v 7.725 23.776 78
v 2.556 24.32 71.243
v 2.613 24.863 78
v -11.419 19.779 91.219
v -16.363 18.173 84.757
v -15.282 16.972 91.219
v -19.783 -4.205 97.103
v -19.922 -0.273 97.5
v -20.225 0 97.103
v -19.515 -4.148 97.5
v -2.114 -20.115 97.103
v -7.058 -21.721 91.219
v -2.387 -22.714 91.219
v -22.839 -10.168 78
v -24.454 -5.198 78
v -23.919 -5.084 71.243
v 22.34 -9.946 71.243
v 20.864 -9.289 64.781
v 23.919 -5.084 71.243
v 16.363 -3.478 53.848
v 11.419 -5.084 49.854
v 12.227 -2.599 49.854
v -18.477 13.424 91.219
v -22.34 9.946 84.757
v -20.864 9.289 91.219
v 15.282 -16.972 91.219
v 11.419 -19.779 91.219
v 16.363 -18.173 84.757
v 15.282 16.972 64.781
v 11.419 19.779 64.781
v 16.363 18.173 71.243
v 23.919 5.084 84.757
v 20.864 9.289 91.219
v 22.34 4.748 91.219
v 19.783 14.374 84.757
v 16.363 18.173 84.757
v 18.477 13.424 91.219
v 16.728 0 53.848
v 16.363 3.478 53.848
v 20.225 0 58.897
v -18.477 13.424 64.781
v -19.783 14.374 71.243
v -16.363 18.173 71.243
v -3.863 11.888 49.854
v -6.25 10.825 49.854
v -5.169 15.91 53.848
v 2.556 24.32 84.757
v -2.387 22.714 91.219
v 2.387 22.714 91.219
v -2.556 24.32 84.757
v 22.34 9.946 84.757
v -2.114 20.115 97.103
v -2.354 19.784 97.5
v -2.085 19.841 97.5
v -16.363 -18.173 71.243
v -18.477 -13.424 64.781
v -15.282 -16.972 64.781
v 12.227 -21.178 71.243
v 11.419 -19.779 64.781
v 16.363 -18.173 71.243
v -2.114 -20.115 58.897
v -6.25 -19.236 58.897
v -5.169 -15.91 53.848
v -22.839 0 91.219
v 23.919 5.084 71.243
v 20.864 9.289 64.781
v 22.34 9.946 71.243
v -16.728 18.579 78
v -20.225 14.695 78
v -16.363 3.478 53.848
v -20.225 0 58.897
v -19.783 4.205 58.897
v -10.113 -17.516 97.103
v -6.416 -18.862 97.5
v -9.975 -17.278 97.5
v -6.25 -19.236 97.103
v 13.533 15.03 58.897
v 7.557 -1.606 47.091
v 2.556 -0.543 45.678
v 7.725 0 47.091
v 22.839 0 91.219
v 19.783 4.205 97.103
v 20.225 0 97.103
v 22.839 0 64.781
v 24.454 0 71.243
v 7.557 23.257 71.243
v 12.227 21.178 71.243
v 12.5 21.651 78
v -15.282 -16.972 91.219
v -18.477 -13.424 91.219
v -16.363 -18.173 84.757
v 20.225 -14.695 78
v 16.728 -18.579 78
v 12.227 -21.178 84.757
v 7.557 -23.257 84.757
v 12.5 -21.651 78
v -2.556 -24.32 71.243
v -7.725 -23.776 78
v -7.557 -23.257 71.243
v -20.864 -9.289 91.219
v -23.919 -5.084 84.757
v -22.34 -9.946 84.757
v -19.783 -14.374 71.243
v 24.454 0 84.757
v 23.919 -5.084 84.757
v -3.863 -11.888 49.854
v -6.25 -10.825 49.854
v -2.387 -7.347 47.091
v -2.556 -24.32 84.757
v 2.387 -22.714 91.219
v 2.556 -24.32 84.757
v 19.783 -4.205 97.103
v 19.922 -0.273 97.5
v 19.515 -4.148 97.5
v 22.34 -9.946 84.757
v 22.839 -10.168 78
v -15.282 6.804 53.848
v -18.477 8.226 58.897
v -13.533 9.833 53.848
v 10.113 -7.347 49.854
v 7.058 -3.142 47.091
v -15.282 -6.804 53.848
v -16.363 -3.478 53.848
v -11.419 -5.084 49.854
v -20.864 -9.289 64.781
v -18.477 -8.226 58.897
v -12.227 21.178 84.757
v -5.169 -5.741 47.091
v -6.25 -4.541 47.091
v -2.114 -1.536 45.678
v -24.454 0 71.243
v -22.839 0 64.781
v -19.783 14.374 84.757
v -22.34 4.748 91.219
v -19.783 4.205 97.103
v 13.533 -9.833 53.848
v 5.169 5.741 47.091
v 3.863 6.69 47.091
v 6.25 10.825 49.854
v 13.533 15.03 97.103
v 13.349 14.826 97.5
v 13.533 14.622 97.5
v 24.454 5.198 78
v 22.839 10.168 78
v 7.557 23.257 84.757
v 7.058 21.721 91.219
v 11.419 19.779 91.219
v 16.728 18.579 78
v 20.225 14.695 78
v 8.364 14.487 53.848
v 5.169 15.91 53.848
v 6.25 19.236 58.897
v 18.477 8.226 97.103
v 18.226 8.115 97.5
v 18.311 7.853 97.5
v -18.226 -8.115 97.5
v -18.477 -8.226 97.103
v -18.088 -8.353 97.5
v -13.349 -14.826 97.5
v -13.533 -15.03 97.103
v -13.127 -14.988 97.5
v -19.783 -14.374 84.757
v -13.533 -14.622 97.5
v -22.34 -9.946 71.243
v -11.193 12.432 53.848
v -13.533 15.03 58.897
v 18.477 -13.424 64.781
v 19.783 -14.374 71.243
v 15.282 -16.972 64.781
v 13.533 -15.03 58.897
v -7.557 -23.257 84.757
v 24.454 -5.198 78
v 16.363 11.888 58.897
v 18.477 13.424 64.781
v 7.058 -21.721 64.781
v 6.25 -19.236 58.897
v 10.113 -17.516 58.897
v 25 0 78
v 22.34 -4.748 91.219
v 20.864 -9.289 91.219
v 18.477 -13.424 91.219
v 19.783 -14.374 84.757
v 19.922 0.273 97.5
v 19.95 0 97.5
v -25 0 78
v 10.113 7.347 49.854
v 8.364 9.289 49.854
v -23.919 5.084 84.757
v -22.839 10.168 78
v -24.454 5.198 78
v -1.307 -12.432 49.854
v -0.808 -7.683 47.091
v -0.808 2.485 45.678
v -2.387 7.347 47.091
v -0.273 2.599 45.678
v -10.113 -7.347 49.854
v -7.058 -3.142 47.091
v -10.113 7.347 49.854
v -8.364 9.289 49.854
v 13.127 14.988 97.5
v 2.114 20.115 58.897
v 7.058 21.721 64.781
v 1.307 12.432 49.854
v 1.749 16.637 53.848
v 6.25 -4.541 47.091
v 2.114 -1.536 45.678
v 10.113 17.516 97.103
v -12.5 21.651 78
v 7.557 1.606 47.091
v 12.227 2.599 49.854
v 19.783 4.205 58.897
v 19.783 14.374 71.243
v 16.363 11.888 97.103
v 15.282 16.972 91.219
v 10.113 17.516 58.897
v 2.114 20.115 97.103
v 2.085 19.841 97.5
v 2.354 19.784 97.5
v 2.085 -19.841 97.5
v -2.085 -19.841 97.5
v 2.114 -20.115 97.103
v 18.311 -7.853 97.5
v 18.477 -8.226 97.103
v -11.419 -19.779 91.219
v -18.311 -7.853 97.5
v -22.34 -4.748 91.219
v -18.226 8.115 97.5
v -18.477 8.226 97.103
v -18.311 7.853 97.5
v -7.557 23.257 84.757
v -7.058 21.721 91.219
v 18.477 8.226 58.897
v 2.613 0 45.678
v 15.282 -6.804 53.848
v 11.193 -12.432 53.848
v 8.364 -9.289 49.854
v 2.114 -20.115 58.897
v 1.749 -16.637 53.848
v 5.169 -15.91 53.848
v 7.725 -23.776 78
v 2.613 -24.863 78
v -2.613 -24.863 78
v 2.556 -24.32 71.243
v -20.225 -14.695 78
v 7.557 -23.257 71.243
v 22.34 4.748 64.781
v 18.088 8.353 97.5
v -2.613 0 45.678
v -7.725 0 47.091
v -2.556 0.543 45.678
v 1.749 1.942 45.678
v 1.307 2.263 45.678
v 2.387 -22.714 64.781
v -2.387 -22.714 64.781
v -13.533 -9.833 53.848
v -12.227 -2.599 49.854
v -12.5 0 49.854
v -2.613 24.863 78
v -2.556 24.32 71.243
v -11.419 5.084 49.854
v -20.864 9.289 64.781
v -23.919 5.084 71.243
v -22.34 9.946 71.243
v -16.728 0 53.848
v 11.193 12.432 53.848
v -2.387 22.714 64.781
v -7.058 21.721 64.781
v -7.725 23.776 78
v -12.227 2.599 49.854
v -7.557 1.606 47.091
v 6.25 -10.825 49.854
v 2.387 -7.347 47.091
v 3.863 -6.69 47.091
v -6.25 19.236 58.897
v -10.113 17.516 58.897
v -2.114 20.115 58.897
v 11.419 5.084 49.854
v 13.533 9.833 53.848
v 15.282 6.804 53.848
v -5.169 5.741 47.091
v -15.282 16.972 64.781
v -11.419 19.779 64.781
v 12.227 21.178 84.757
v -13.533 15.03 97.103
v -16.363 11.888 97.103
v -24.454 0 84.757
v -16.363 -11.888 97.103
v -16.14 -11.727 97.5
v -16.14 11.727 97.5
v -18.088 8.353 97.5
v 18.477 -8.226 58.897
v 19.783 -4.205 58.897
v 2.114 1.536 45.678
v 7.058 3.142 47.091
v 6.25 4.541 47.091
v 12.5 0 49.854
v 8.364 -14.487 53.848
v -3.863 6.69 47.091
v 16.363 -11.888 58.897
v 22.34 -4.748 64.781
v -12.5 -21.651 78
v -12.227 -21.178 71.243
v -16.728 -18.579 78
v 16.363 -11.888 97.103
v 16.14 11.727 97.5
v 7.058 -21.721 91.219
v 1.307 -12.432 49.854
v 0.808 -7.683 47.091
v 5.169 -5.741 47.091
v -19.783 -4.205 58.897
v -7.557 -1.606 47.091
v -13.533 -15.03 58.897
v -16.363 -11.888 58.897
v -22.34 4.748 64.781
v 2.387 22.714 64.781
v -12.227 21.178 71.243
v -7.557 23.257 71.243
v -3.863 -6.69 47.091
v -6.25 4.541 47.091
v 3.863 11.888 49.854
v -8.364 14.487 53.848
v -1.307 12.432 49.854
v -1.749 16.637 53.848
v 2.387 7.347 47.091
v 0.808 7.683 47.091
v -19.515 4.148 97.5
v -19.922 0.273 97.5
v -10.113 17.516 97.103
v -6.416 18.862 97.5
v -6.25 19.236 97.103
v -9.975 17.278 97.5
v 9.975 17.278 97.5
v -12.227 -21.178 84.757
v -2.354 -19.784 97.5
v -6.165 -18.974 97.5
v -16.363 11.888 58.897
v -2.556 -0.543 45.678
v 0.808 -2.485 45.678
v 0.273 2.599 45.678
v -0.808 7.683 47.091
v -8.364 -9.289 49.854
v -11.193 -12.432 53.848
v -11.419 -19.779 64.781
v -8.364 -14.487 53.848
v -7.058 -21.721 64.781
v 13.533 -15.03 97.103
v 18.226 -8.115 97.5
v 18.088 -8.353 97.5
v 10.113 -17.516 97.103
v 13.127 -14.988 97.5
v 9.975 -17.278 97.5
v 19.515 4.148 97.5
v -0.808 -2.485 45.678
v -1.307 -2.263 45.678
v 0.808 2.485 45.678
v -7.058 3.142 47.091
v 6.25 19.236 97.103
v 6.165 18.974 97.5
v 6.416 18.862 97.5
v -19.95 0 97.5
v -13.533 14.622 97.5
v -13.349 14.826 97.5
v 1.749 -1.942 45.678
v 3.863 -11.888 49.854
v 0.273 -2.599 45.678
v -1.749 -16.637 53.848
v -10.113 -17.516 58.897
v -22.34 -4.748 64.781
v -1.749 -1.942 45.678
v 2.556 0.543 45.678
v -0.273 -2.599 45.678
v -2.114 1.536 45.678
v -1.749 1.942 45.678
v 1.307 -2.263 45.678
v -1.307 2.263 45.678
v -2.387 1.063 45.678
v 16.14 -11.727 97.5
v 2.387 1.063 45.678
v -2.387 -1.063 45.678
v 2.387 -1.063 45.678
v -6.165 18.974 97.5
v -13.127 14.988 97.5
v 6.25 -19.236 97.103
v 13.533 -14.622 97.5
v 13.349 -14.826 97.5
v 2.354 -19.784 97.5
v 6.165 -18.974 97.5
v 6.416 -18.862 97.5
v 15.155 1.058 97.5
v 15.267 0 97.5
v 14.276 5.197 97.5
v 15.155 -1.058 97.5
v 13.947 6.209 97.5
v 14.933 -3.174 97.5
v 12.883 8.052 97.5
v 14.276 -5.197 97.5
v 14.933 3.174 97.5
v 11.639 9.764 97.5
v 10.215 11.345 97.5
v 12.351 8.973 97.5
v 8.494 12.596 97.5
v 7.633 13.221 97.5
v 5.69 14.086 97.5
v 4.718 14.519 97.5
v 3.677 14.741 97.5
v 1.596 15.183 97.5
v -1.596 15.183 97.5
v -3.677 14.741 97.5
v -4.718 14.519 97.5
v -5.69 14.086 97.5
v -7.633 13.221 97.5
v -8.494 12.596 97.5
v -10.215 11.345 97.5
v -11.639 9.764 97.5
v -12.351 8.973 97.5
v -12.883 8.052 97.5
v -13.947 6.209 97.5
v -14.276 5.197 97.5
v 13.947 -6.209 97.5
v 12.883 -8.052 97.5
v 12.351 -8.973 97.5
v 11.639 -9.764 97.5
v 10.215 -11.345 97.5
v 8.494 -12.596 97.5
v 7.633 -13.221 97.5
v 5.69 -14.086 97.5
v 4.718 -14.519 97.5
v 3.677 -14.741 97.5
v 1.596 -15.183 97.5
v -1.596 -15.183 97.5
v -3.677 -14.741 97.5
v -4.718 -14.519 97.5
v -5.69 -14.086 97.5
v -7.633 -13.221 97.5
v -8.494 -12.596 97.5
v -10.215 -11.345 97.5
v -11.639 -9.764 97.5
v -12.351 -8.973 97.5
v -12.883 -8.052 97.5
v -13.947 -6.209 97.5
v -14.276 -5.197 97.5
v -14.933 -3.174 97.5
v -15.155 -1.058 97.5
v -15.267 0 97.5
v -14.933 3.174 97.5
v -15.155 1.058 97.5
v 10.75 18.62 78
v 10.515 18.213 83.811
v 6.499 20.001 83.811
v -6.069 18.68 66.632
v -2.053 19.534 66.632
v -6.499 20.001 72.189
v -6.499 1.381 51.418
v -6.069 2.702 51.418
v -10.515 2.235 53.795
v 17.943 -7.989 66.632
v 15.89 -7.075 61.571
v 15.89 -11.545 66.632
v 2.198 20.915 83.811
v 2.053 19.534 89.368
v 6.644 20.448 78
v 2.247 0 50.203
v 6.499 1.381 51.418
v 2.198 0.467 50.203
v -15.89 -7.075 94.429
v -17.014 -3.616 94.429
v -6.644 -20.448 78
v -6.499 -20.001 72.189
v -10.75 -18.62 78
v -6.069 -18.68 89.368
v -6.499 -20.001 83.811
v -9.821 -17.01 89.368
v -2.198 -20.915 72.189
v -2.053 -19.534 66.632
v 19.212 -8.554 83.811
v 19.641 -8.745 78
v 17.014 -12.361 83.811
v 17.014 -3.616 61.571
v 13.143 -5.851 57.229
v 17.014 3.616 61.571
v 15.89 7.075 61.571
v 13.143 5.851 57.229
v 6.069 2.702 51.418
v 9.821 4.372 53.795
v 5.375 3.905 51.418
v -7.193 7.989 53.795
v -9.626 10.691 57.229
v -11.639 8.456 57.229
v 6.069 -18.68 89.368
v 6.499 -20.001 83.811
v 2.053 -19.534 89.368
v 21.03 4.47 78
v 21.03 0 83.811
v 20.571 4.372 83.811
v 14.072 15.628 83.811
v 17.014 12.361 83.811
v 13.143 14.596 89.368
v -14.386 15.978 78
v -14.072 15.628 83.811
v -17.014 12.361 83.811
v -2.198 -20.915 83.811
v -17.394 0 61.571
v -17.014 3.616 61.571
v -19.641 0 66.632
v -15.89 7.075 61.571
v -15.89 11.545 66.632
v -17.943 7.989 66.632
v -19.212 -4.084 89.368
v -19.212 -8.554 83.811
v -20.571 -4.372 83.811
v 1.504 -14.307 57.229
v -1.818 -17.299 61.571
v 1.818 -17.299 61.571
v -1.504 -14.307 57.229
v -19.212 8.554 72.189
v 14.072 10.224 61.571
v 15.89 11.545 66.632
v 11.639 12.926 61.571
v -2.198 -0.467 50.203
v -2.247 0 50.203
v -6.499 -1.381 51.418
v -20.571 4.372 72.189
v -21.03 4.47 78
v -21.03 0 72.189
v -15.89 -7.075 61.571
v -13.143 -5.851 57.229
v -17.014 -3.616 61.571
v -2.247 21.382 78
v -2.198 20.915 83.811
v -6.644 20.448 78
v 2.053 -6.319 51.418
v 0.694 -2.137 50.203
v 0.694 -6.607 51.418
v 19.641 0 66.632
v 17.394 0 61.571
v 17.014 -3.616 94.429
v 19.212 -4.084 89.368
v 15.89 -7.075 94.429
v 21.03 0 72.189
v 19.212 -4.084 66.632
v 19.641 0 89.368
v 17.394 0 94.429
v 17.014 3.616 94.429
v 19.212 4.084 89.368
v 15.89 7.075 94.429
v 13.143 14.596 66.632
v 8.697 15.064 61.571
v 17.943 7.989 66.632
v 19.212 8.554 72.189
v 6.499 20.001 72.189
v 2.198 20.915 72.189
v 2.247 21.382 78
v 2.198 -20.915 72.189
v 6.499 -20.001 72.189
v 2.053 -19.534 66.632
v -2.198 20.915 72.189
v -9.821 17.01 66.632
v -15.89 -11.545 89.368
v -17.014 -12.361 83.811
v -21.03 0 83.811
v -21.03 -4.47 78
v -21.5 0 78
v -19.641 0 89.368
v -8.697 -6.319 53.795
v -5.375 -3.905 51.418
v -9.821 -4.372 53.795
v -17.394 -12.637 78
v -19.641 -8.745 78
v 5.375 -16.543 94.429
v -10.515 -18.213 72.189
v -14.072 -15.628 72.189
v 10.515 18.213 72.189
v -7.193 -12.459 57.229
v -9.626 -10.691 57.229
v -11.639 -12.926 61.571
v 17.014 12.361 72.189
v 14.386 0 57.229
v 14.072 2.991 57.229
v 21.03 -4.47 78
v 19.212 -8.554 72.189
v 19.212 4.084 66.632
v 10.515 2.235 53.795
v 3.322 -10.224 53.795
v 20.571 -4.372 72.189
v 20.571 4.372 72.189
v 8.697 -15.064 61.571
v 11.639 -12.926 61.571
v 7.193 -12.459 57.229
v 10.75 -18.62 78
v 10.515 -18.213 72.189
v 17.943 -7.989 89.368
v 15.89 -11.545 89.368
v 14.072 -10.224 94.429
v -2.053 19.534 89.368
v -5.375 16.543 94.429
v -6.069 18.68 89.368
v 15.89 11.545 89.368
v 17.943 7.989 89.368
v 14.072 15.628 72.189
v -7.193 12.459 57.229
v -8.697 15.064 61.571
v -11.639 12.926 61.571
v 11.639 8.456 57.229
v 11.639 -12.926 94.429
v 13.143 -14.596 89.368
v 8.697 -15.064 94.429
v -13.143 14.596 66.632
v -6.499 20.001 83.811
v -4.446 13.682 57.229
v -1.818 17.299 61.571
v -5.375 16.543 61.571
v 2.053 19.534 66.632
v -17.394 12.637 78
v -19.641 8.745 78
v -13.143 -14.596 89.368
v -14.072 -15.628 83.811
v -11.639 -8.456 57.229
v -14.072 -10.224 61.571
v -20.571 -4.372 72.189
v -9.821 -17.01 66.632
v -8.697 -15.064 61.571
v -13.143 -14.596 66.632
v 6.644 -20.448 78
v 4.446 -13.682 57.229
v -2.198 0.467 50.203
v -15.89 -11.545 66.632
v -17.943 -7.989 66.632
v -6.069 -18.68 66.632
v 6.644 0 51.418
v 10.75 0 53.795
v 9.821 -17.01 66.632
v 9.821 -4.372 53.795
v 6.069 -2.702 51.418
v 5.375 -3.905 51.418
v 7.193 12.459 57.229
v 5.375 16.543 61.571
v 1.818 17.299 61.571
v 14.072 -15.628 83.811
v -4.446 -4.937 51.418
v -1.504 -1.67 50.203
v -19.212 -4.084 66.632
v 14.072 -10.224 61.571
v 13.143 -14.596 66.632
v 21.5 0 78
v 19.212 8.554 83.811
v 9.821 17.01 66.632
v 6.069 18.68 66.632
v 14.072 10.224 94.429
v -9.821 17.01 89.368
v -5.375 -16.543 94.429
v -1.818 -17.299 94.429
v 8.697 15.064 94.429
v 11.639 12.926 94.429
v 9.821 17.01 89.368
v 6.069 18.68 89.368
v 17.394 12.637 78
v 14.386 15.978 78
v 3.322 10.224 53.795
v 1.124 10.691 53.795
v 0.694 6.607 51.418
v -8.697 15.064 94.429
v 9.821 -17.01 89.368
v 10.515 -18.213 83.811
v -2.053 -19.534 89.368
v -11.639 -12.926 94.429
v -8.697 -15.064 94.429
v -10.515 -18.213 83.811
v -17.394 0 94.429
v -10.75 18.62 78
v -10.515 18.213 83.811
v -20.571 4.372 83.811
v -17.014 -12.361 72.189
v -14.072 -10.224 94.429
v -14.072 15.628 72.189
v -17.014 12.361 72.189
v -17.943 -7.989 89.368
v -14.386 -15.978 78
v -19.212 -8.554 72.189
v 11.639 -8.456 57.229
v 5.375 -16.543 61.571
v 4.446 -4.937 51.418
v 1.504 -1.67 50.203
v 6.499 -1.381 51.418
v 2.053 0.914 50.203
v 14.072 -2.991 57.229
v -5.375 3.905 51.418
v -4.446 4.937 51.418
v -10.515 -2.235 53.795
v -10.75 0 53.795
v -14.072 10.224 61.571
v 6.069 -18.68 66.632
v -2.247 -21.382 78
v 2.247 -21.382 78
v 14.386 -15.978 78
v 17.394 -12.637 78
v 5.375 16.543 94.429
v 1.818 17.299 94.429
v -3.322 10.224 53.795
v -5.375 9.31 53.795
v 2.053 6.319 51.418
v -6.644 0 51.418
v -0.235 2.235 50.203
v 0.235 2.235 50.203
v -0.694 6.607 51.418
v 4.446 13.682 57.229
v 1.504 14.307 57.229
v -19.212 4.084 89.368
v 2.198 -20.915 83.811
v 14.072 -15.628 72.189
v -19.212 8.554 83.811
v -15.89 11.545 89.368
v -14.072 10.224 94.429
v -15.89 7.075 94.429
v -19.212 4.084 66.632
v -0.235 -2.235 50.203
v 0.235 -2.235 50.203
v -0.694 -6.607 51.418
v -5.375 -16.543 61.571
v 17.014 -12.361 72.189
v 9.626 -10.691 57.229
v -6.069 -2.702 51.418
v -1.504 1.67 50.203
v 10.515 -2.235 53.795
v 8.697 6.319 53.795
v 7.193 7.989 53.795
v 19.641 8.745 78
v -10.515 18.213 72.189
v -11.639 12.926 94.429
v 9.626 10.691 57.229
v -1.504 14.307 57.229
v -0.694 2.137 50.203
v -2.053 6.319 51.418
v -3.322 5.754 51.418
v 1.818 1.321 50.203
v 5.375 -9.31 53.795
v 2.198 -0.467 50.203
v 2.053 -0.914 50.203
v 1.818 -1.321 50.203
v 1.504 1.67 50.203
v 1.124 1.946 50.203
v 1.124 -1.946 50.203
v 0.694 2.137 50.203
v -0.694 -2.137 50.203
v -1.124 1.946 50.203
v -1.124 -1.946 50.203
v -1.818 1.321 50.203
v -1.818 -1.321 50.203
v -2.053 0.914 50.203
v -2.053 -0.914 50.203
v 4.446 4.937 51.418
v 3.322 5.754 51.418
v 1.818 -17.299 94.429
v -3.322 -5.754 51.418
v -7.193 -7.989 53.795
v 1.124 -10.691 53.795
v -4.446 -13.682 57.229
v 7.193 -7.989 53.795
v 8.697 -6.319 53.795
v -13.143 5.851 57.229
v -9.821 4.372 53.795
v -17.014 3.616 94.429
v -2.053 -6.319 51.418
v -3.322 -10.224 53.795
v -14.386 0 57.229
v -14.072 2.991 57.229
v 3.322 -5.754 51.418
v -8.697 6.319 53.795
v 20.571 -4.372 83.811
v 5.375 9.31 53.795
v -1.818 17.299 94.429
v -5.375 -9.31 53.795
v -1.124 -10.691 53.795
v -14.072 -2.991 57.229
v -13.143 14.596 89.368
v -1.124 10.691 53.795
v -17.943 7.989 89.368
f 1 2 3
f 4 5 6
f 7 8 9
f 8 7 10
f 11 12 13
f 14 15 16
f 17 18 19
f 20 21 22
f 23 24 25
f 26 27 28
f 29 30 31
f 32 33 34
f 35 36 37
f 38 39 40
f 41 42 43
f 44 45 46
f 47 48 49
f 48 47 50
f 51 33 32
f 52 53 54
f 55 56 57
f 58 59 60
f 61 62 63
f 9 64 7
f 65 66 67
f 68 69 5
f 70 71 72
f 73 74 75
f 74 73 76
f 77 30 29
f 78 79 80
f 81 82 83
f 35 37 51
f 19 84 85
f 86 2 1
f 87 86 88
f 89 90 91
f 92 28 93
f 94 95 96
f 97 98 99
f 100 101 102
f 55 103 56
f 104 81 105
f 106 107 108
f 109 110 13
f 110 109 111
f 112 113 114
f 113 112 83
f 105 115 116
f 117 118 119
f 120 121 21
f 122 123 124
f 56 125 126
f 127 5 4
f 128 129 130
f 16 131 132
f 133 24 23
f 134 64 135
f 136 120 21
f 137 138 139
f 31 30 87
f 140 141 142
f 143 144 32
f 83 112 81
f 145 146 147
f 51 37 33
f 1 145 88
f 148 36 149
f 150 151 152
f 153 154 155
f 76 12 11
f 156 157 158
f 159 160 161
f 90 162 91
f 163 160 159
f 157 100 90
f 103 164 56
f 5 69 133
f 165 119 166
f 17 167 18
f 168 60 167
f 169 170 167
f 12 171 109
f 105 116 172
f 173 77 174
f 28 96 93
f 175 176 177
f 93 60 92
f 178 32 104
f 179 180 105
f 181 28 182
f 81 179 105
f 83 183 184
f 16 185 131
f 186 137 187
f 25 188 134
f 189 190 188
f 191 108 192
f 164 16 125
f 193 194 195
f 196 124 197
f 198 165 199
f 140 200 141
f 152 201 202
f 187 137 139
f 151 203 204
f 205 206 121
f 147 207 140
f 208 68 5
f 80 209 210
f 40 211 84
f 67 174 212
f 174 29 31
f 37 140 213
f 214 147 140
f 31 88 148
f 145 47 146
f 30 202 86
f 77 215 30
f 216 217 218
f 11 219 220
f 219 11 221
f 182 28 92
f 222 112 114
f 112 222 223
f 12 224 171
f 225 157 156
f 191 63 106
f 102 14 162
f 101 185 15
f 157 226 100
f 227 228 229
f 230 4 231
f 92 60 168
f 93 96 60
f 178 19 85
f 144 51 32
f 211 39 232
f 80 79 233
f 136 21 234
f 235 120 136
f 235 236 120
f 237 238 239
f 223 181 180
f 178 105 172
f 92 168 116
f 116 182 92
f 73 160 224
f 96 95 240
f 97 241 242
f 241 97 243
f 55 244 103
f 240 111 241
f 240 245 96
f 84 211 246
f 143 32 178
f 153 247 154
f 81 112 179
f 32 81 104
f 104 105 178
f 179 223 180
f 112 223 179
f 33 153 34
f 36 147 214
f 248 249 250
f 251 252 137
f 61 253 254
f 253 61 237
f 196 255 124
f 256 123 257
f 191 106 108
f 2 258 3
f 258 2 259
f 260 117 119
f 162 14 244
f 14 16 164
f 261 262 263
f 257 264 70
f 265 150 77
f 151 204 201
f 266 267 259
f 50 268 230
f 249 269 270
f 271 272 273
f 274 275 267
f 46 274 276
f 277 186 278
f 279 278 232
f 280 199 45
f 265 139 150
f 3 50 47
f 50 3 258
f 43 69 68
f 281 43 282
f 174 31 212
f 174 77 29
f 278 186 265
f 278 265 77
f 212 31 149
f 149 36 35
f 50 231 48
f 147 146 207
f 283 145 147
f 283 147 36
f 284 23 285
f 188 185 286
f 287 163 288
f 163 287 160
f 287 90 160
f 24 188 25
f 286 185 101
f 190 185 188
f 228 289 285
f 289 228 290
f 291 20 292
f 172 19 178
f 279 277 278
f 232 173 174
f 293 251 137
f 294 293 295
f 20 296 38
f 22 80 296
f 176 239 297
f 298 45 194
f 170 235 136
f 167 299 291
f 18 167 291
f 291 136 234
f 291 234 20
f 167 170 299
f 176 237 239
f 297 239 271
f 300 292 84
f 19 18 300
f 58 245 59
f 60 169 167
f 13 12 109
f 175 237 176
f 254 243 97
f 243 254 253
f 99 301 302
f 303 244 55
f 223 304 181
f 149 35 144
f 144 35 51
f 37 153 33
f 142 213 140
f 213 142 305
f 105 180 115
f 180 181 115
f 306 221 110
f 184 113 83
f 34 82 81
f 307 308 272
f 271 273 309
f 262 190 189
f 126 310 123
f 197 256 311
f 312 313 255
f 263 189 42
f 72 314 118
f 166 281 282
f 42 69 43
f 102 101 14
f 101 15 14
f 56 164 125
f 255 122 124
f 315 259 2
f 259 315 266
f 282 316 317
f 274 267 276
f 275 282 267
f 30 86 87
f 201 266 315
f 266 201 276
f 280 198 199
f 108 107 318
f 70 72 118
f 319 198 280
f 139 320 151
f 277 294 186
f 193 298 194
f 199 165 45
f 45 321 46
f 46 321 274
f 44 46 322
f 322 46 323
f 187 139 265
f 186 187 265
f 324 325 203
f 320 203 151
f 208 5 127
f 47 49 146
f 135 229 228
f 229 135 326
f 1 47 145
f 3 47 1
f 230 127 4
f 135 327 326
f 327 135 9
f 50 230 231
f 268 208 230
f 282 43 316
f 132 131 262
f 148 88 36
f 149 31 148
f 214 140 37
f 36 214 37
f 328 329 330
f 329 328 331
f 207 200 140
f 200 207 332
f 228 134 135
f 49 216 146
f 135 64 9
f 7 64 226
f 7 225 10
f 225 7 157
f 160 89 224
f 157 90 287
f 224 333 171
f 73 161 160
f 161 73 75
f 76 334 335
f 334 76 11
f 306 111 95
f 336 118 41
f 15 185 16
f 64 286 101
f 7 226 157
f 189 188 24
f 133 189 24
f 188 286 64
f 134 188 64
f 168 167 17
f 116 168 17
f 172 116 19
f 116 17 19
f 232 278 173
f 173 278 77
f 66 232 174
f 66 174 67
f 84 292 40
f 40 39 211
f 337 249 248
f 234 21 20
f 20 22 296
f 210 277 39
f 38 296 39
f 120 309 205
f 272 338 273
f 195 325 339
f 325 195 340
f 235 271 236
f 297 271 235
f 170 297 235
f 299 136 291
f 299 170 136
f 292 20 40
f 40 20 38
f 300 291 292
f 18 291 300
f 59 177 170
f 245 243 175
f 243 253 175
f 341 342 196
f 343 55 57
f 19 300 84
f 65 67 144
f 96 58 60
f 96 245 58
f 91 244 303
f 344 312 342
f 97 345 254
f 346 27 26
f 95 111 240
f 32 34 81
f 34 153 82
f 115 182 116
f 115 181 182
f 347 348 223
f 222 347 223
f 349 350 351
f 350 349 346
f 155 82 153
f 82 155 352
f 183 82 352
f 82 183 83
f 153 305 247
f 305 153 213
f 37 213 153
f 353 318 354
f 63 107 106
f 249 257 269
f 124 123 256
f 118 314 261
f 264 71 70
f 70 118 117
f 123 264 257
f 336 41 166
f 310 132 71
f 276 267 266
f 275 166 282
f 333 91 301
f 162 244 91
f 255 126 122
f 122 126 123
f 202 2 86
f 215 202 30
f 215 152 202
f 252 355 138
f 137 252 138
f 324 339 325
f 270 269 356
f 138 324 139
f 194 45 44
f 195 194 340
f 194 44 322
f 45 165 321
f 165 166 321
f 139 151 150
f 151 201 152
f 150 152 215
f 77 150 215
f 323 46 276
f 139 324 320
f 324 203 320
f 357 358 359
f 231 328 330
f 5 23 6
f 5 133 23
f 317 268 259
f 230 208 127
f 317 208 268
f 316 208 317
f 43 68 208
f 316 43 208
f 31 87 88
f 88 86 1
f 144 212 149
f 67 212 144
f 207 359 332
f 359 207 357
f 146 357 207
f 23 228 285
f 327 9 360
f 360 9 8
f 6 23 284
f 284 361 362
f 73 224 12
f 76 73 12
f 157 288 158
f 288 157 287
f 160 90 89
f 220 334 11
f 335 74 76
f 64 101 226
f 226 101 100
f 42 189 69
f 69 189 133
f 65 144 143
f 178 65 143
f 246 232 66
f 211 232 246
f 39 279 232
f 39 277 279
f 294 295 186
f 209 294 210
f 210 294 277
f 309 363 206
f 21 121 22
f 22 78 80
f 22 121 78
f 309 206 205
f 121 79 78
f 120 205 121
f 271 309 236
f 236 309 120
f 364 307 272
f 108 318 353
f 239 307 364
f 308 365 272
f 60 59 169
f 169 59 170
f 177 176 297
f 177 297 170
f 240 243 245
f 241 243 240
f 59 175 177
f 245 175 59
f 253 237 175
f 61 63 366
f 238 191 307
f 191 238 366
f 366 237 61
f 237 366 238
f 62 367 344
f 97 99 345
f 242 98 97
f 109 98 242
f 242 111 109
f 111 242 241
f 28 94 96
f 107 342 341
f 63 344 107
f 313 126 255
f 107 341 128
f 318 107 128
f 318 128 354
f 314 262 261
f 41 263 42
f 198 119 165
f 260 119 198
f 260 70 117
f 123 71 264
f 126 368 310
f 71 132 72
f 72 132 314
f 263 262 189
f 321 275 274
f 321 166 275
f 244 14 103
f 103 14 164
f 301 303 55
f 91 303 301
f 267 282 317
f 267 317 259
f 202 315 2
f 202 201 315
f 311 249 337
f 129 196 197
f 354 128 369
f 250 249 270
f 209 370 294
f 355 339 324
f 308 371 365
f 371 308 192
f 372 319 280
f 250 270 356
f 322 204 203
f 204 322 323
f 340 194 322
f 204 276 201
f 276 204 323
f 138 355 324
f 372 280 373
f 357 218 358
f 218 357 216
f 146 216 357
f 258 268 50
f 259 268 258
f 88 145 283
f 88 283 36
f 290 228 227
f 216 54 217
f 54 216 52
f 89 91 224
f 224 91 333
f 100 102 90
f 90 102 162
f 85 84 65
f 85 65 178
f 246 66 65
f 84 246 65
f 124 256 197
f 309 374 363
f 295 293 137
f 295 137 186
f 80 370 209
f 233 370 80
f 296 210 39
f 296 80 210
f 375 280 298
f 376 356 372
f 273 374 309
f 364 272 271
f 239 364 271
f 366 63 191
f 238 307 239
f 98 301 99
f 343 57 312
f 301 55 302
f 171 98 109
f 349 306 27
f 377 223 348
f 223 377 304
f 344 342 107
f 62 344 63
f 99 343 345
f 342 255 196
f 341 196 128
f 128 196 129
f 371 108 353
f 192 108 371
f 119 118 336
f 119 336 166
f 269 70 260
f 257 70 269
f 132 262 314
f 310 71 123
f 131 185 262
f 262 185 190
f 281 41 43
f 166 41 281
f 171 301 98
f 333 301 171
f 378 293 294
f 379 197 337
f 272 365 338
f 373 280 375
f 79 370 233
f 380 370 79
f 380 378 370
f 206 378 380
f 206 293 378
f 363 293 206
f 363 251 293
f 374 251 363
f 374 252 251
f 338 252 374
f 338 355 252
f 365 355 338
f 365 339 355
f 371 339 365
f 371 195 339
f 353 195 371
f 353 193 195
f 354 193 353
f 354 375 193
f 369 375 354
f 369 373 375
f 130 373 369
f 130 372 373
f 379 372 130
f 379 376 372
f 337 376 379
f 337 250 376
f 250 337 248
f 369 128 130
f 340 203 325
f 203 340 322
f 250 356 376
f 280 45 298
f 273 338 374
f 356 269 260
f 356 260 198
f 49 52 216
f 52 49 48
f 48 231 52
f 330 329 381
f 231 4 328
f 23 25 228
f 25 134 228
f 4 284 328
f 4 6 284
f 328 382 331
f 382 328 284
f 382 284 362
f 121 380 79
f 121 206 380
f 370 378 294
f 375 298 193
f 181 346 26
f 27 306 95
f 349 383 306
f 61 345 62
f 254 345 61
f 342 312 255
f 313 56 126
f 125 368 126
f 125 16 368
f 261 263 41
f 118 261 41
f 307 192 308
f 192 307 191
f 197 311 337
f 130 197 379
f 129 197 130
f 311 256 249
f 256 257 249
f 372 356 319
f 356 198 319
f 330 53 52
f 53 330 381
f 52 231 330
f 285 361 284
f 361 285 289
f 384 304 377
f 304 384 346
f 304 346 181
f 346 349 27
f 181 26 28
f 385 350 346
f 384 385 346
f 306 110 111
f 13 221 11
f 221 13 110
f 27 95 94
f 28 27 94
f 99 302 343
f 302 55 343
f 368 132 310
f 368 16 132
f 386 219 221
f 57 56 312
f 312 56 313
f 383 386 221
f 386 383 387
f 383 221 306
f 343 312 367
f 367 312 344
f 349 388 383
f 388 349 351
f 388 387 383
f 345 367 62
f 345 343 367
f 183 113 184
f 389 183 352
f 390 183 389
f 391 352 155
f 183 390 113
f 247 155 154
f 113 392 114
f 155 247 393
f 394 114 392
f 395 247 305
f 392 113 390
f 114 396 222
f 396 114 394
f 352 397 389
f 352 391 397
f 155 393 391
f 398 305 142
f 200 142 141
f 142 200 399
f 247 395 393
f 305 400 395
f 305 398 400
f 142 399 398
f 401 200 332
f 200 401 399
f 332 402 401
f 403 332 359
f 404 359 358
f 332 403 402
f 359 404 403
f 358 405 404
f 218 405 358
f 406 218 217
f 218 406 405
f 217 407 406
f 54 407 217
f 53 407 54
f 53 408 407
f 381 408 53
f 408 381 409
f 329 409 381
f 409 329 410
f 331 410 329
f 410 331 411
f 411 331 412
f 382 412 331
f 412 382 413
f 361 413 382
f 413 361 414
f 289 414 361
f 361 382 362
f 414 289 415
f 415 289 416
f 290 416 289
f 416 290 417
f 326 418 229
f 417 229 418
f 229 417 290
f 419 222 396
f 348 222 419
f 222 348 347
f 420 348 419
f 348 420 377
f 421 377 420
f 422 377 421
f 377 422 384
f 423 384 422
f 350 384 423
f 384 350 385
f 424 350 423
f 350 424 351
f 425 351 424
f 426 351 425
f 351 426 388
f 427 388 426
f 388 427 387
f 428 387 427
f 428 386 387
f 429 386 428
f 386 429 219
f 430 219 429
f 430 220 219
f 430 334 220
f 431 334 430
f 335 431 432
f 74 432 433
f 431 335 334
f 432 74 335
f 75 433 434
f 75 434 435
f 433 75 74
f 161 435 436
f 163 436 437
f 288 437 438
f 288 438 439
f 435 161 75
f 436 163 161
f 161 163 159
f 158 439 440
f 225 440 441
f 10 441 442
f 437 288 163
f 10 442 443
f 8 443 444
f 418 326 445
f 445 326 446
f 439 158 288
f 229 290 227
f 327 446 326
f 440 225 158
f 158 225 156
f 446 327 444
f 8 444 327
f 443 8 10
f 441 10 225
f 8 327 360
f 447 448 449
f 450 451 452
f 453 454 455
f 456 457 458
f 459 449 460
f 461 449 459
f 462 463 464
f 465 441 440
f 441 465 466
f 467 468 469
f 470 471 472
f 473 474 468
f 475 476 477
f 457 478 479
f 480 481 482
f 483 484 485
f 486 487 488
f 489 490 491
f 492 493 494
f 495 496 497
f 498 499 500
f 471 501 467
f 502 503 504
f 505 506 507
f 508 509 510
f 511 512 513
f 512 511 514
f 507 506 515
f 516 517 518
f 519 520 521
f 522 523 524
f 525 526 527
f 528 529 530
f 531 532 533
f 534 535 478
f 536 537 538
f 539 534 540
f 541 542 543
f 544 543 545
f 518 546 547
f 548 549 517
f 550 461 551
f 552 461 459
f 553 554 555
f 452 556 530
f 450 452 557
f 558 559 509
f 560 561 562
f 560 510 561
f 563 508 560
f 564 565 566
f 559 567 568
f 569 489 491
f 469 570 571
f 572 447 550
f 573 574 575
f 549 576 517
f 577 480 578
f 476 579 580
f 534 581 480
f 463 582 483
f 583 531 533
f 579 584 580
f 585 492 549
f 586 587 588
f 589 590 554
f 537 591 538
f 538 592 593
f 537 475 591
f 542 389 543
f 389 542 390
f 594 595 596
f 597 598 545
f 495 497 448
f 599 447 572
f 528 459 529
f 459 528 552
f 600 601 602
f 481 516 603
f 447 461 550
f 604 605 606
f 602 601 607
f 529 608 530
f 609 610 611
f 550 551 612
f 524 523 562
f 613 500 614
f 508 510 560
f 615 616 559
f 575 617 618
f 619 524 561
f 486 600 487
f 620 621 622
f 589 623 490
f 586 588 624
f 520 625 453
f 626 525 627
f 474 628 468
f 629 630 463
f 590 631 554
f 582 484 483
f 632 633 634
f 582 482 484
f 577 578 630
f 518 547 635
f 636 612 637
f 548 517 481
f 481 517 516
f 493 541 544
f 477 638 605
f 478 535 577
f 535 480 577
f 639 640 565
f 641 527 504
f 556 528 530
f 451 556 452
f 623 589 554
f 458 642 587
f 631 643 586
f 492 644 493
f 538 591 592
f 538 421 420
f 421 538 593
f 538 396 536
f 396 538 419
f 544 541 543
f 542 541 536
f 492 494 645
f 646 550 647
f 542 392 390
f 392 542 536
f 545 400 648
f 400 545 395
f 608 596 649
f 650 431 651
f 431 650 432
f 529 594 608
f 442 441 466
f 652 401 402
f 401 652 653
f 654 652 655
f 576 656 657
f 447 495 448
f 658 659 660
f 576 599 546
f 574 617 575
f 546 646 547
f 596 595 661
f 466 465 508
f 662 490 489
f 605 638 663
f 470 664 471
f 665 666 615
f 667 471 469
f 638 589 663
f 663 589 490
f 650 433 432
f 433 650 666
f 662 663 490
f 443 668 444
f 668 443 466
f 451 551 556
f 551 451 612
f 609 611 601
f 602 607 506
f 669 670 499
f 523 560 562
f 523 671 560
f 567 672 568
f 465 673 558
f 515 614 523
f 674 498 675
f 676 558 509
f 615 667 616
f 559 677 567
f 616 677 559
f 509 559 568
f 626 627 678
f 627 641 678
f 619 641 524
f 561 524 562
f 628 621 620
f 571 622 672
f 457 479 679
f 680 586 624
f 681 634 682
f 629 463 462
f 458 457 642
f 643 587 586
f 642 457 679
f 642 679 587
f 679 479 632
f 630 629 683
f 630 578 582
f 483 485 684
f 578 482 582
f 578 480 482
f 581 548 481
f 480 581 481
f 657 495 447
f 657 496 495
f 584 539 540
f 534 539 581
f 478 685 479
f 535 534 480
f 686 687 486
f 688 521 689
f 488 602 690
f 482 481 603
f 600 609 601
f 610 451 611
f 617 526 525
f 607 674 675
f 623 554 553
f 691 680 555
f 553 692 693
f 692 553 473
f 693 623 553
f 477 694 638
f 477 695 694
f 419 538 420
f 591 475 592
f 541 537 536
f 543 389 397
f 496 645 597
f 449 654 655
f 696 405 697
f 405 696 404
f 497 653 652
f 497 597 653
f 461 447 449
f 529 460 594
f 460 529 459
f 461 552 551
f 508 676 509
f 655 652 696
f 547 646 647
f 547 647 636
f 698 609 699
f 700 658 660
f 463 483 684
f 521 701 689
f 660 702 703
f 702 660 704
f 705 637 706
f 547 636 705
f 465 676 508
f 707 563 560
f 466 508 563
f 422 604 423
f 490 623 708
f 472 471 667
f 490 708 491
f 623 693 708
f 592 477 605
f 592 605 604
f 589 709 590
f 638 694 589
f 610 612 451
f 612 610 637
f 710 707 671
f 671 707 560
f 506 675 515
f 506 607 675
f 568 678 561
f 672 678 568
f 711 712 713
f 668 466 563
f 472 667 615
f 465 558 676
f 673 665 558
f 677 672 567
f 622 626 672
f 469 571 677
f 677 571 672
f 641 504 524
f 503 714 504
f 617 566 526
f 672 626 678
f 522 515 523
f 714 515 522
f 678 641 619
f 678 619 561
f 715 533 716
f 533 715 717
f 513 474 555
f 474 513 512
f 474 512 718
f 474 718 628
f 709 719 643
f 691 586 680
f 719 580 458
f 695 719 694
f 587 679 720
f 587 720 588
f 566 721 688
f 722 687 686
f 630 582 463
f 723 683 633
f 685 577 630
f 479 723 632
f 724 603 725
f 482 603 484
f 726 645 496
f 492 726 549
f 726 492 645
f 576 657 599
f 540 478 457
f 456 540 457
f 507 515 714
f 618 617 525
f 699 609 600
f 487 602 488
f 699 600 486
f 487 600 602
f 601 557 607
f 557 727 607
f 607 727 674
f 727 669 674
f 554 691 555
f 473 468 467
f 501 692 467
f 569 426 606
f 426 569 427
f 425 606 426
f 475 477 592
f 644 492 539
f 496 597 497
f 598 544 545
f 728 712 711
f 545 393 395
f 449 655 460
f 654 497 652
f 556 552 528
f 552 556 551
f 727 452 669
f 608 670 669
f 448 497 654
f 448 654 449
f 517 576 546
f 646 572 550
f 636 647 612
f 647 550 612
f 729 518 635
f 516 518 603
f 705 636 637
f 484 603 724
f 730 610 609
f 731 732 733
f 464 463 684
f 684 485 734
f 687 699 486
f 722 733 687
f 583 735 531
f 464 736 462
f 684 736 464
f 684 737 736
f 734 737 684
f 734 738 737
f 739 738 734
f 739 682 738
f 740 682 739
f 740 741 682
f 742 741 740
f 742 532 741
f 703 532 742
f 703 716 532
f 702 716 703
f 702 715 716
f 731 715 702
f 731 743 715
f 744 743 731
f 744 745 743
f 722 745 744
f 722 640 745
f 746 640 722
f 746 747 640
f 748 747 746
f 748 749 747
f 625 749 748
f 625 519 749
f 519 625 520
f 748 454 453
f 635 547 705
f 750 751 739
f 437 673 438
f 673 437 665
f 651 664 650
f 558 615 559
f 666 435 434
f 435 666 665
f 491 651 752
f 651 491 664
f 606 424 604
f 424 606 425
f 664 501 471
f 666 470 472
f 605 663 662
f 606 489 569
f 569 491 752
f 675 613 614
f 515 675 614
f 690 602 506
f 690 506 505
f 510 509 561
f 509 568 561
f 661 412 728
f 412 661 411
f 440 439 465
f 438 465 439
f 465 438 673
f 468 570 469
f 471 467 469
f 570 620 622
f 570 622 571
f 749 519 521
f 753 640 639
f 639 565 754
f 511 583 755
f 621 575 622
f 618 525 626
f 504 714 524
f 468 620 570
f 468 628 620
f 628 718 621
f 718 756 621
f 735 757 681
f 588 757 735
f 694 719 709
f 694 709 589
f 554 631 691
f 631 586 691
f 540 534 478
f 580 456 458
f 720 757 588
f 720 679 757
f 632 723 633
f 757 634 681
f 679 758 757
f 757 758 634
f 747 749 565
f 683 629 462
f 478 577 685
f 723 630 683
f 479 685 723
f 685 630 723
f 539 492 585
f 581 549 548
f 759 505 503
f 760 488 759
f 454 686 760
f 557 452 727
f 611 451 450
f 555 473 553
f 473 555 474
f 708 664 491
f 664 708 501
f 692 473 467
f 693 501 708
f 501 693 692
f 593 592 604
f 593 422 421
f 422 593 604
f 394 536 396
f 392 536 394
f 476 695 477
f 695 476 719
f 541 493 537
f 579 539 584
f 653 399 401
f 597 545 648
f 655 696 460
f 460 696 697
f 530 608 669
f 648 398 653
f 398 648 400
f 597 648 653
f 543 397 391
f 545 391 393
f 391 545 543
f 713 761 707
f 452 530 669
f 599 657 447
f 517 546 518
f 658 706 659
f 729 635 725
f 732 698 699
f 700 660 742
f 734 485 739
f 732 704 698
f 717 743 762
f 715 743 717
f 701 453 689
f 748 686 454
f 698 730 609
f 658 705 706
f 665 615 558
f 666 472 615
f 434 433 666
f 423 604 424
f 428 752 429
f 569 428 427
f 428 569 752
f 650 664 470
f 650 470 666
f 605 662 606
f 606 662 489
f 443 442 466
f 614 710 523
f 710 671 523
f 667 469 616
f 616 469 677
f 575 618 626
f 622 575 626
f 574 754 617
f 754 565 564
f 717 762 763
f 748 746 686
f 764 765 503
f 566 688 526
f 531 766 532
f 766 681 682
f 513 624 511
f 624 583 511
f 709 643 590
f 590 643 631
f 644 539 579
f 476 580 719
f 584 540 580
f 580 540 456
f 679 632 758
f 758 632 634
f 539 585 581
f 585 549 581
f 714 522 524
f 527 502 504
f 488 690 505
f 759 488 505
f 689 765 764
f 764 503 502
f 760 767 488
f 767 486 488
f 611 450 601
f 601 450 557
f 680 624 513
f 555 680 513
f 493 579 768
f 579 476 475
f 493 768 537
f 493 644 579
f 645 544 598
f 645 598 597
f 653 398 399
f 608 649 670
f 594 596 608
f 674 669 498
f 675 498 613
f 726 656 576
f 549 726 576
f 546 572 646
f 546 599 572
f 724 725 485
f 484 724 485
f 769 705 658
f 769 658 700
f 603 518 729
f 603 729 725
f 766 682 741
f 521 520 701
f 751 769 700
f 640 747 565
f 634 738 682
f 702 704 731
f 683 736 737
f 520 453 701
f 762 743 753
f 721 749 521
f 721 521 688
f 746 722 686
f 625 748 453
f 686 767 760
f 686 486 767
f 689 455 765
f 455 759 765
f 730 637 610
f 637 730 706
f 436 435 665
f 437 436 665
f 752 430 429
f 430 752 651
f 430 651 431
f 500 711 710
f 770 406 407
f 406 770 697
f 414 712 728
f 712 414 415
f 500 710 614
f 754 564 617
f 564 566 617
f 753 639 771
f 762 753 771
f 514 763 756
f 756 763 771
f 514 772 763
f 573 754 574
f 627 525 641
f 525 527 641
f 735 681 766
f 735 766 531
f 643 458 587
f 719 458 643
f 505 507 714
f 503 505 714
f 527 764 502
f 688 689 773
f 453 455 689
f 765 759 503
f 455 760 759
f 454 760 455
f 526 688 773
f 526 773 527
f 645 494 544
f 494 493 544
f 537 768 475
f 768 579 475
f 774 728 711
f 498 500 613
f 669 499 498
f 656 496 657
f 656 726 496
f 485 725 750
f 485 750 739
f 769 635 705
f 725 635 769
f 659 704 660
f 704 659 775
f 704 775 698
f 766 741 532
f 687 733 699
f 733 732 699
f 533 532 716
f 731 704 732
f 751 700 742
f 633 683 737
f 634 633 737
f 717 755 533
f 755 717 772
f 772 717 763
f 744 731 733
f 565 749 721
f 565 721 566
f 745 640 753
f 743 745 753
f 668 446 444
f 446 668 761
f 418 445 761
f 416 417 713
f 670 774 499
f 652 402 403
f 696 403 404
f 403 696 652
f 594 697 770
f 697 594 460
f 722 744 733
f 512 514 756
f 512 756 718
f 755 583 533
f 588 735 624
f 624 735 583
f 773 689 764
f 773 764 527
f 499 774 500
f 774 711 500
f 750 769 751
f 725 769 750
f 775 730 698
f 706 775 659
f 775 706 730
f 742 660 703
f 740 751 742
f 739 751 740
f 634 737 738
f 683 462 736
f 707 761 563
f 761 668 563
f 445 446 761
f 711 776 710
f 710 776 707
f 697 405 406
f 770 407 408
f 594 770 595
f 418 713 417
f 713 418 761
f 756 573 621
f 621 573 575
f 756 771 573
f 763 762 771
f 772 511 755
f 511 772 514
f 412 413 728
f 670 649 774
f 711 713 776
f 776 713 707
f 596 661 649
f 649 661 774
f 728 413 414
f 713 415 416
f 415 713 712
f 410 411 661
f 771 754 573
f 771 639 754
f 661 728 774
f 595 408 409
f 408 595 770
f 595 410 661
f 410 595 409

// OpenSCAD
module box(x = 10, y = 20, z = 30, center = false)
{
	scale([x,y,z])
	{
		cube(1, center = center);
	}
}

module cone(radius = 10, height = 20, center = false)
{
	cylinder(height, radius, 0, center = center);
}

module tube(outer = 20, inner = 10, height = 100, center = false)
{
	difference()
	{
		cylinder(r = outer, h = height, center = center);
		cylinder(r = inner, h = height, center = center);
	}
}

module pyramid(width = 20, height = 20)
{
	polyhedron(
		points = [
			[width, 0, 0],
			[0, width, 0],
			[-width, 0, 0],
			[0, -width, 0],
			[0, 0, height]
		],
		triangles = [
			[0, 1, 2, 3],
			[4, 1, 0],
			[4, 2, 1],
			[4, 3, 2],
			[4, 0, 3]
		]
	);
}

module wedge(width = 10, height = 20, depth = 30)
{
	rotate([0, -90, 0])
	{
	polyhedron(
		points = [
			[0, 0, 0],
			[height, 0, 0],
			[0, width, 0],
			[0, 0, depth],
			[height, 0, depth],
			[0, width, depth]
		],
		triangles = [
			[0,1,2],
			[5,4,3],
			[3,4,1,0],
			[0,2,5,3],
			[4,5,2,1]
		]
	);
	}
}

module cross(width = 30, thickness = 10, depth = 5)
{
	union()
	{
		box(thickness, width, depth, center = true);
		box(width, thickness, depth, center = true);
	}
}

module stem()
{
	union()
	{
		intersection()
		{
			cylinder(60, 7, 7);
			translate([0,0,20])
			{
				cross(15, 5, 40);
			}
		}

		translate([0, 0, 40*2-21])
		{
			rotate([180, 0, 0])
			{
				intersection()
				{
					cylinder(30, 20, 5);
					translate([0,0,15])
					{
						cross(40, 5, 30);
					}
				}
			}
		}
	}
}

module cup()
{
	scale([1,1,1.3])
	{
		difference()
		{
			sphere(25);
			translate([0, 0, 40])
			{
				cube(50, true);
			}
			sphere(21.5);
		}
	}
}

module base()
{
	union()
	{
		cylinder(4, 20, 20);
		translate([0, 0, 4])
		{
			scale([0.2, 0.2, 0.04])
			{
				sphere(100);
			}
		}
	}
}

module wineglass()
{

		difference()
		{
			union()
			{
				stem();
				base();
			}
			translate([0, 0, 40*2.45-20])
			{
				scale([1,1,1.3])
				{
					sphere(23.5);
				}
			}
			translate([-25,-25, 55])
				cube(50,false);
		}

}
//translate([40, 0, 0])
//cube(60,false);
//wineglass();
translate([0,0,40*2.45-20])
cup();
